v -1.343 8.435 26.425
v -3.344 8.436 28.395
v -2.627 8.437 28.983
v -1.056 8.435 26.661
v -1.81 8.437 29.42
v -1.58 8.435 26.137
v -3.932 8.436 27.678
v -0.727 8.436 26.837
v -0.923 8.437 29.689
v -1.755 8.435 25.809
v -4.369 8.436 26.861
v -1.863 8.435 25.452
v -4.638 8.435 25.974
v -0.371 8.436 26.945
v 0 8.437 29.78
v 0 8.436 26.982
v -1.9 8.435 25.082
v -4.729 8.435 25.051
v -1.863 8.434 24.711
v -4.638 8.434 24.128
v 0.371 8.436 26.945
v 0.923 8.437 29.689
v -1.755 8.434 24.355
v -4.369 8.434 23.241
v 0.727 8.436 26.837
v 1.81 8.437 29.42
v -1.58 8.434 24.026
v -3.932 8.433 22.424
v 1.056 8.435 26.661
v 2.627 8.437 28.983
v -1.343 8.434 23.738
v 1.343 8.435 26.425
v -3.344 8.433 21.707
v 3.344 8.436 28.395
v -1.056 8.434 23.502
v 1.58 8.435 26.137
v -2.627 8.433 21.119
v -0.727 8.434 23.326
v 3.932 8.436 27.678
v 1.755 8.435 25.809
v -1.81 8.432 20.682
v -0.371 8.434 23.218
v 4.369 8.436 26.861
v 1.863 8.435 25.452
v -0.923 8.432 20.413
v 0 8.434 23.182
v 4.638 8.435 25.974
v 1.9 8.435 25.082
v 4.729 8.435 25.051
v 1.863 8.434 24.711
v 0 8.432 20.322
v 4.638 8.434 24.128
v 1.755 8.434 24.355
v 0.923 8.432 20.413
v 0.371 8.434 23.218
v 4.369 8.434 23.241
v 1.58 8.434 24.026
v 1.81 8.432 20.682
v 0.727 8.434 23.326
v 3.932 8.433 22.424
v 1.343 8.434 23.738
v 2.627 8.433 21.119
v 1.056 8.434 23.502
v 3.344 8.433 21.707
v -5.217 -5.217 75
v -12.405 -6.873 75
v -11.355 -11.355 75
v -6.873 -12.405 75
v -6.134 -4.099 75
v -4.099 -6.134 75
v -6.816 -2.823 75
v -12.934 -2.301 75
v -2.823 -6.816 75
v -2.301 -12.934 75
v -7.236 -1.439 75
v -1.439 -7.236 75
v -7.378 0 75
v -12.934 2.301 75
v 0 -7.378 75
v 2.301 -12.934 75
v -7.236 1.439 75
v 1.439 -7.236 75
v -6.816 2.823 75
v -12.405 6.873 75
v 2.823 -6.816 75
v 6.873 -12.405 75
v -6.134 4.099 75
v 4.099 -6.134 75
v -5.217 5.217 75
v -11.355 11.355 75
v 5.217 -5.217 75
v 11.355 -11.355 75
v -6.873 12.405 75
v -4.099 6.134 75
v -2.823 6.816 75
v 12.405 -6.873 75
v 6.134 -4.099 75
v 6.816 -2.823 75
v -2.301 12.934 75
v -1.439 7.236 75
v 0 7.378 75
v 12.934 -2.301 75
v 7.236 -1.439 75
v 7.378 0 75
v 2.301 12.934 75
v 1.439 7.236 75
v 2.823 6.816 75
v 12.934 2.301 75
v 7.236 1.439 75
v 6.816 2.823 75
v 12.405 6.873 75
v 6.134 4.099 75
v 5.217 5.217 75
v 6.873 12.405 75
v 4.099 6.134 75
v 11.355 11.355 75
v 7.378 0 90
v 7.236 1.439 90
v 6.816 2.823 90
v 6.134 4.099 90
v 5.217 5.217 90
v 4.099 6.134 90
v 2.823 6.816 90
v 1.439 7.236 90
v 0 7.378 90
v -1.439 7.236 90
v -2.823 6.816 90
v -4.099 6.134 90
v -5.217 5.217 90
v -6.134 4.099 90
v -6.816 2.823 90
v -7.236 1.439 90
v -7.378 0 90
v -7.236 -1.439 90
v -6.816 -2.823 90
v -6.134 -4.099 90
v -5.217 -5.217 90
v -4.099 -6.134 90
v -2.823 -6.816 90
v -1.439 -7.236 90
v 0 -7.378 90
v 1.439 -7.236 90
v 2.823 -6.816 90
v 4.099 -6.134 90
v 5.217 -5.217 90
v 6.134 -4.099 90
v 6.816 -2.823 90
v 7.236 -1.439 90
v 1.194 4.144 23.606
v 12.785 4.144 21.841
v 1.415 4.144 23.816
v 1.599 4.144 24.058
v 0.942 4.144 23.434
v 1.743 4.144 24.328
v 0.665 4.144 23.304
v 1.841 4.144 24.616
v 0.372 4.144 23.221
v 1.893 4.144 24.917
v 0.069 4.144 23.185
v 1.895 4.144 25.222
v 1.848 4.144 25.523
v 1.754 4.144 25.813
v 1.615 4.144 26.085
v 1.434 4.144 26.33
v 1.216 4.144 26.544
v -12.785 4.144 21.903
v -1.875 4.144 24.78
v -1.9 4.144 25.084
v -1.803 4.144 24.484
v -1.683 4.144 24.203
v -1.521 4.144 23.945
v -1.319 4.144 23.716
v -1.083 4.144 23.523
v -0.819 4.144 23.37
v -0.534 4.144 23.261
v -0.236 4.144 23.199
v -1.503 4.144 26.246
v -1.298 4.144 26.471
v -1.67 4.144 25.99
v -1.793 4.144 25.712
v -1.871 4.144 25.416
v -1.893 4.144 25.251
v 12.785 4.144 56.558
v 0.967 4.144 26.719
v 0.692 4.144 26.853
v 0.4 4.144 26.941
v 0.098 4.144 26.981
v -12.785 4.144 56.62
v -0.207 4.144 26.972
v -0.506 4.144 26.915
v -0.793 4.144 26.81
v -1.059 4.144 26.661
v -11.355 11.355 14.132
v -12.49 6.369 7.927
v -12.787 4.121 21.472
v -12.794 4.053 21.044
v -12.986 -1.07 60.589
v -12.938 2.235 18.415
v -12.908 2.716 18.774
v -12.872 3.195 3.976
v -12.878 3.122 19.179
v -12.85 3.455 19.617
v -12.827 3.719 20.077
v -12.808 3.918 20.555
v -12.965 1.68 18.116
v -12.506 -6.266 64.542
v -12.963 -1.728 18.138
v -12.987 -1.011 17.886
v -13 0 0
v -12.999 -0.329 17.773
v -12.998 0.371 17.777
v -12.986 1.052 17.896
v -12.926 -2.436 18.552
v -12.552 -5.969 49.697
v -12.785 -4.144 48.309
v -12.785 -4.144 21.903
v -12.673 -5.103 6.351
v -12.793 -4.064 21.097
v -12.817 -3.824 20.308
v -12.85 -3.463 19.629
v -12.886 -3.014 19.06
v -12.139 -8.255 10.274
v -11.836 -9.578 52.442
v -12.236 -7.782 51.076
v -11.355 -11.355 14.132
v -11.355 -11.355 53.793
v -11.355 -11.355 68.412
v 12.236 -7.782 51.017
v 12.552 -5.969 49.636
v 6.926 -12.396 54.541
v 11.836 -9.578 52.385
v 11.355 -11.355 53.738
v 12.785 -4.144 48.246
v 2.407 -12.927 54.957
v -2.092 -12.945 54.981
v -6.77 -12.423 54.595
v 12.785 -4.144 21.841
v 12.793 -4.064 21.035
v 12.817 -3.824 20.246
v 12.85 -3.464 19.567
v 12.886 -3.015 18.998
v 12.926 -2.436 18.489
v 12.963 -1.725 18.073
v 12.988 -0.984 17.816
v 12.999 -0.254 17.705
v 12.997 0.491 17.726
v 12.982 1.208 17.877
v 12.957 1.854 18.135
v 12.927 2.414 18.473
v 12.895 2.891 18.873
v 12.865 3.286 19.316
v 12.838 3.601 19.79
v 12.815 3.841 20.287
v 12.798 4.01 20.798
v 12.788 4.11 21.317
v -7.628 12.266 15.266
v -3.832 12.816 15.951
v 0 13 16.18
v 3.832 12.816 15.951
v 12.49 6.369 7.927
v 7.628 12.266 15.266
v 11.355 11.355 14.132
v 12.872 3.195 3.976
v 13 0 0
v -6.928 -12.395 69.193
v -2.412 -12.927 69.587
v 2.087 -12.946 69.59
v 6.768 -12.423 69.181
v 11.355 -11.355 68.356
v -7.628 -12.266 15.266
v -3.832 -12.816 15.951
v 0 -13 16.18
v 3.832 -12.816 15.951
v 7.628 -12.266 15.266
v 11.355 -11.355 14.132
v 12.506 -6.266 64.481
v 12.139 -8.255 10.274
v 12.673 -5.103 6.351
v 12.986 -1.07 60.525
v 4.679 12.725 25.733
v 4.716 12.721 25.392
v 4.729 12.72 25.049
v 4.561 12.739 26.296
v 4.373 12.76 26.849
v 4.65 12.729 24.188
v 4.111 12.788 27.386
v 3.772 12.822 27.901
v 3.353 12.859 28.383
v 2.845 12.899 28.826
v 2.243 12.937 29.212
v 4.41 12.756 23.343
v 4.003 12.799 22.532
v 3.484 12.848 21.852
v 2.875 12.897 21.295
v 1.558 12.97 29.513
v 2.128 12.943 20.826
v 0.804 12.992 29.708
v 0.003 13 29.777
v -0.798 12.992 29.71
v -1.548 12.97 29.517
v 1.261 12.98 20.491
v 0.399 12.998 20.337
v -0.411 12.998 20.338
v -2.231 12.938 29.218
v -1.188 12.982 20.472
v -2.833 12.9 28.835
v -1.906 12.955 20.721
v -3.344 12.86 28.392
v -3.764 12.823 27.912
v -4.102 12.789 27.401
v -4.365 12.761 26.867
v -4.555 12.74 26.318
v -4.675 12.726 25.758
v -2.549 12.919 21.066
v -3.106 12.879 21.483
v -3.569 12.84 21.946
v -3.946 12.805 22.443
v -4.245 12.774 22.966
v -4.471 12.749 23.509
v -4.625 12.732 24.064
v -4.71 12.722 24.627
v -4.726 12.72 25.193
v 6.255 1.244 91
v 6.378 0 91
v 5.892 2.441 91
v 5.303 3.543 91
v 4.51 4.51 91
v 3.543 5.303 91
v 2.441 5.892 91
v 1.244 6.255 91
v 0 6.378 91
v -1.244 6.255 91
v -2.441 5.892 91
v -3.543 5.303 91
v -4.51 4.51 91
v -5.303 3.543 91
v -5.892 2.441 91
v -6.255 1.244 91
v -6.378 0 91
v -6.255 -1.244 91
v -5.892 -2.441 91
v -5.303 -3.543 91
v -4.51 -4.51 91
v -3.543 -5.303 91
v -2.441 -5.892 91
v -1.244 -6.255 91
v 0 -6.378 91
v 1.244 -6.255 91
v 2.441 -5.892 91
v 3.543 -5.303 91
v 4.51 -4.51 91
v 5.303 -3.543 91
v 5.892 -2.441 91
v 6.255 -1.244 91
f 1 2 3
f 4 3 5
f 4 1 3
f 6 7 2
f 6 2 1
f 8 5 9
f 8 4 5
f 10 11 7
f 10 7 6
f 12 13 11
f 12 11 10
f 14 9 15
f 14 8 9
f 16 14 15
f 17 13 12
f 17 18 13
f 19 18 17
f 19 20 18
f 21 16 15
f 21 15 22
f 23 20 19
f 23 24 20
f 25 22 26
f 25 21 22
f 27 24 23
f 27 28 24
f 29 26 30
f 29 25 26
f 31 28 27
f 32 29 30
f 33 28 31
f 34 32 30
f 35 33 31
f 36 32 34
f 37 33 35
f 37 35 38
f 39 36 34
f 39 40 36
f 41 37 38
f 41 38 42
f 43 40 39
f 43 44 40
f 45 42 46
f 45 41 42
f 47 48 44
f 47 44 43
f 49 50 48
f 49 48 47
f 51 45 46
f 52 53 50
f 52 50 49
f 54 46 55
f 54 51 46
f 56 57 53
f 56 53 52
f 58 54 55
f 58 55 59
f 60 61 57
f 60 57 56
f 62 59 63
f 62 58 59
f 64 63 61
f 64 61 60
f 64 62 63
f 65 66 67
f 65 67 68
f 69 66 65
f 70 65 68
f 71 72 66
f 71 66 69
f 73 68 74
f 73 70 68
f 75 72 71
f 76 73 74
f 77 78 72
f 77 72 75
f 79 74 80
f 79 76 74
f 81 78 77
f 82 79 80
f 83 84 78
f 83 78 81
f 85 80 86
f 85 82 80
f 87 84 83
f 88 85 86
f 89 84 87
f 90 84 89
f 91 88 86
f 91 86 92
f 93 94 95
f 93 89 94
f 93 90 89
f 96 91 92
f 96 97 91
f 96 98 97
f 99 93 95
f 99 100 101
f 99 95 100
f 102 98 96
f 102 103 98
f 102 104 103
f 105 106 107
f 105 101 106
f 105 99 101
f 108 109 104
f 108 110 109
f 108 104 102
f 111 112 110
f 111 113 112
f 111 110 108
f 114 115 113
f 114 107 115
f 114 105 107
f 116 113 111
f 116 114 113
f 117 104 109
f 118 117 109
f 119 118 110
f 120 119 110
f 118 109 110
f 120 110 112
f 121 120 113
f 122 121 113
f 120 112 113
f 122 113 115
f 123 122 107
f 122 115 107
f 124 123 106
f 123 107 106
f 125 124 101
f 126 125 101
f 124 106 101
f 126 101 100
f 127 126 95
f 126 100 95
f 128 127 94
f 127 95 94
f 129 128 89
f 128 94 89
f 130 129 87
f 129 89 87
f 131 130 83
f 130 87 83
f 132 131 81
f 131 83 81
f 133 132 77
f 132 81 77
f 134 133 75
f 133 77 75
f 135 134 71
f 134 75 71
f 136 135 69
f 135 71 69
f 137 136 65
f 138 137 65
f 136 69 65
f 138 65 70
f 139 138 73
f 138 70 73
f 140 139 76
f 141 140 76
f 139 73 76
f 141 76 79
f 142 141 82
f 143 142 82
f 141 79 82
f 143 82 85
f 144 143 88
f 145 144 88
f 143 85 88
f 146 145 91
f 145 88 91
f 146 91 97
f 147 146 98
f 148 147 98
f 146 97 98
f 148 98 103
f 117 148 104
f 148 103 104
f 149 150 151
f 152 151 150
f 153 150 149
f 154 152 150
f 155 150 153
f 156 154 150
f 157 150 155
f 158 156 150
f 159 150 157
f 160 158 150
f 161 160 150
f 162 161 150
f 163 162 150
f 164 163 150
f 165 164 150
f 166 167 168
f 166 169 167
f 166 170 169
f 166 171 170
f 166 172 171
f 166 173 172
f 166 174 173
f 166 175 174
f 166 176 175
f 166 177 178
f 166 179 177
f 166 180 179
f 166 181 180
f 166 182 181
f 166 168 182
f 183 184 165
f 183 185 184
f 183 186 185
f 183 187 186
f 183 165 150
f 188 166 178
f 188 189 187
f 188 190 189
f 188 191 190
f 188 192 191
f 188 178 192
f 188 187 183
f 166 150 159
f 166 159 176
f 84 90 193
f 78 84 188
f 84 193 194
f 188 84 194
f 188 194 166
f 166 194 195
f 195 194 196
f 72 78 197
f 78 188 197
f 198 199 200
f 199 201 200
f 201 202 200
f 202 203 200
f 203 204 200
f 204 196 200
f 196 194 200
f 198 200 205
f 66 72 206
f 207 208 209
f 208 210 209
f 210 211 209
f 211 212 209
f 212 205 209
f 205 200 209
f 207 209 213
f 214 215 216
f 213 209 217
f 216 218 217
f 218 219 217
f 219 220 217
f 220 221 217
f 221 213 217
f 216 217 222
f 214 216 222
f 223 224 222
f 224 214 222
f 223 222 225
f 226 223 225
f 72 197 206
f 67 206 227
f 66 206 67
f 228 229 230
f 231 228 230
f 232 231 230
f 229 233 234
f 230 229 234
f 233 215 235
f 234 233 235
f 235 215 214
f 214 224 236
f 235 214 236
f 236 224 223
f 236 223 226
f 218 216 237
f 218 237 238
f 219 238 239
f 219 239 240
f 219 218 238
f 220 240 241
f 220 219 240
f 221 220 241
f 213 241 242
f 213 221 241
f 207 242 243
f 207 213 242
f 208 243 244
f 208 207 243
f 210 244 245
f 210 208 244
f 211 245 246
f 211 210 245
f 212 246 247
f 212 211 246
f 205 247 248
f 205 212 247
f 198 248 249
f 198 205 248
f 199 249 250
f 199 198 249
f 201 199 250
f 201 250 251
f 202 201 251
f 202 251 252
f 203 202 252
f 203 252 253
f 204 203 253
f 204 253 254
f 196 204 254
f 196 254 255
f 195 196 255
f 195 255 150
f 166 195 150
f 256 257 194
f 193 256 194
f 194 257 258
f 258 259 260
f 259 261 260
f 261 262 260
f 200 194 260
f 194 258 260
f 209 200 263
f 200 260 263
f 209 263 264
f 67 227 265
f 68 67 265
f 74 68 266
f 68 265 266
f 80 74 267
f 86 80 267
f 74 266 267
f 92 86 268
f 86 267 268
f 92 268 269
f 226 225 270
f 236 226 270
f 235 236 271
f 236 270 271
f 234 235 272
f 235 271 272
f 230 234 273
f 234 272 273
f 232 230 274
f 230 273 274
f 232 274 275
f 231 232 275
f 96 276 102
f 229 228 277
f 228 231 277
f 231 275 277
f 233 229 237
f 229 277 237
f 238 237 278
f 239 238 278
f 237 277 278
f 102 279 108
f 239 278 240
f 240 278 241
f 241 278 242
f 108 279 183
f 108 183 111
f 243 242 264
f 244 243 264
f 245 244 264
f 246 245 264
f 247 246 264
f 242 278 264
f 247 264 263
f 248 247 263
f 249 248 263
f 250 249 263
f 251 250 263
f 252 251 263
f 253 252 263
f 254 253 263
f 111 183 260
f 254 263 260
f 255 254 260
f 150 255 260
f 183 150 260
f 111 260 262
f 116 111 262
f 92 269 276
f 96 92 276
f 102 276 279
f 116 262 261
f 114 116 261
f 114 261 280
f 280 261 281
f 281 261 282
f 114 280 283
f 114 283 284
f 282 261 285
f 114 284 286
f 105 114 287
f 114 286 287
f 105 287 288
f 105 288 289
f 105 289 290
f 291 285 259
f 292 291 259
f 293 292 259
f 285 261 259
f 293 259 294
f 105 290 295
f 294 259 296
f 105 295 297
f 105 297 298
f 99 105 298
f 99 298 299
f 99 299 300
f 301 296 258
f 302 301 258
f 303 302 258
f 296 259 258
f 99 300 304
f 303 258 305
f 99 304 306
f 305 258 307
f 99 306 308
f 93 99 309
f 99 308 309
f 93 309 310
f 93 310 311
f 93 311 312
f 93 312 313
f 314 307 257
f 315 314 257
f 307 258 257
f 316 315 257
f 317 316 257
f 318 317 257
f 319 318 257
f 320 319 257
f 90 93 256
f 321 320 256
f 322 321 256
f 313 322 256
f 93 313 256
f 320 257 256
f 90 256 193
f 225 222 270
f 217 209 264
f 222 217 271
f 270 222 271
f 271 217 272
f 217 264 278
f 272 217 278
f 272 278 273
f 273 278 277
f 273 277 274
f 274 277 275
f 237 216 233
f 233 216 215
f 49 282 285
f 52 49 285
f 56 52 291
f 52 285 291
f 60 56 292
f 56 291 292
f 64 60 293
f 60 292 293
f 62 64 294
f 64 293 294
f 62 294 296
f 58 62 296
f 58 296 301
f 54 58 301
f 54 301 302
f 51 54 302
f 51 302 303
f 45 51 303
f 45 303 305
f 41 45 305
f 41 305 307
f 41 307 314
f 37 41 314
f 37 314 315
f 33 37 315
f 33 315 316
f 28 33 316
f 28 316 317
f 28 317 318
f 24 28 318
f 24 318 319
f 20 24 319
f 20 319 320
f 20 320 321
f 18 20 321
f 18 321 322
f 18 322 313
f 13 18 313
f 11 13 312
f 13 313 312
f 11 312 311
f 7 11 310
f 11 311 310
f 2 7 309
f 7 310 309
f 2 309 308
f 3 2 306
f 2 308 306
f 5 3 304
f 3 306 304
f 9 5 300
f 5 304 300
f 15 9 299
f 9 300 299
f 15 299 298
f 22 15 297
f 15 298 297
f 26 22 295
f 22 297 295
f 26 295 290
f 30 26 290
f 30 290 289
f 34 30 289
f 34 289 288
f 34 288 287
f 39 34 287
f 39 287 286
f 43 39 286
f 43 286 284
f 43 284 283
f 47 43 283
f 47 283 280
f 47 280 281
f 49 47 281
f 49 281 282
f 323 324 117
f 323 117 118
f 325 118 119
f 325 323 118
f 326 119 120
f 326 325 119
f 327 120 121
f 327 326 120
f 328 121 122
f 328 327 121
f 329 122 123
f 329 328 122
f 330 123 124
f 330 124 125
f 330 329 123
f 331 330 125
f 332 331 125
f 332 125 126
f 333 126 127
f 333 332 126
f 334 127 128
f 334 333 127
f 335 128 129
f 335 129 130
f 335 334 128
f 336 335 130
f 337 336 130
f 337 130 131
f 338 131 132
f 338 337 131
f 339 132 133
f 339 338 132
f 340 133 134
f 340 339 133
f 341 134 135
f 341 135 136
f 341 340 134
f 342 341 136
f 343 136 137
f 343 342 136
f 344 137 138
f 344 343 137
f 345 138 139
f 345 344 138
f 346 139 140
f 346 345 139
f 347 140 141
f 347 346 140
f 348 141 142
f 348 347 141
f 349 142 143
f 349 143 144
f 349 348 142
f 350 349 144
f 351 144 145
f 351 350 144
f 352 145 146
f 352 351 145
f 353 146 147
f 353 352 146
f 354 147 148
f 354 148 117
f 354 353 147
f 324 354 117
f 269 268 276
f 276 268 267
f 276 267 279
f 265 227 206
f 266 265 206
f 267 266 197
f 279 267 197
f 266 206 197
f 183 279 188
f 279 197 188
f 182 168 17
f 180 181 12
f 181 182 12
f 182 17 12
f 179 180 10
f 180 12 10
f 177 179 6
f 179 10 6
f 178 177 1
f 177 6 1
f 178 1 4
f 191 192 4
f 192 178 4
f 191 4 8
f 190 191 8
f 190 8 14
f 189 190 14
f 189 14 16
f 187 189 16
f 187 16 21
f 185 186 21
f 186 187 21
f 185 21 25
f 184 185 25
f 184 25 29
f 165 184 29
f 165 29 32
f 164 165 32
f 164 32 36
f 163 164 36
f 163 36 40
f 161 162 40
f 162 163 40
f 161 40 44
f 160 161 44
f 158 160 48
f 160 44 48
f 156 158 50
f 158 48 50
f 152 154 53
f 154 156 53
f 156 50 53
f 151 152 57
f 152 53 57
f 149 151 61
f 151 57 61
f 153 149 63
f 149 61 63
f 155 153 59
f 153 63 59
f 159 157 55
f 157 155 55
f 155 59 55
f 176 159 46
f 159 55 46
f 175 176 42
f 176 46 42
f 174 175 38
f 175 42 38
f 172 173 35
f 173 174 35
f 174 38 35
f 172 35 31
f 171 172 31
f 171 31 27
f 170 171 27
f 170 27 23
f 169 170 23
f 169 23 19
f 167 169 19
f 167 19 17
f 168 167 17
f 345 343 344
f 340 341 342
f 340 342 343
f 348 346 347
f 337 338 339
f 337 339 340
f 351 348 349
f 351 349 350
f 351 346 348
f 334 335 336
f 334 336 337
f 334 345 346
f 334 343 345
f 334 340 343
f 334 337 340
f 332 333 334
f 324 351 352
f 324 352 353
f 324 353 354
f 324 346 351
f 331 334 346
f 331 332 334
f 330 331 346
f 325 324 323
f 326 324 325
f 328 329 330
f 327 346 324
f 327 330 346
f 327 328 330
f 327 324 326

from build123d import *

# Parameters (mm, degrees)
PAD_DEPTH            = 75
SKETCH001_R          = 7.377572
PAD001_DEPTH         = 16
CHAMFER_SIZE         = 1
POCKET_DEPTH         = 13.001
POCKET_DEPTH_BACK    = -13.001
SKETCH003_R          = 4.728662
POCKET001_DEPTH      = 5
POCKET002_DEPTH      = 0.001
POCKET002_DEPTH_BACK = -27.579089
SKETCH005_R          = 1.899906
POCKET003_DEPTH      = 5


with BuildPart() as part:
    # Sketch → Pad (new body)
    with BuildSketch(Plane.XY):
        with BuildLine():
            ThreePointArc((-11.354577, 11.354577), (-13, 0), (-11.354577, -11.354577))
            ThreePointArc((-11.354577, -11.354577), (0, -13), (11.354577, -11.354577))
            ThreePointArc((11.354577, -11.354577), (13, 0), (11.354577, 11.354577))
            ThreePointArc((11.354577, 11.354577), (0, 13), (-11.354577, 11.354577))
        make_face()
    extrude(amount=PAD_DEPTH)

    # Sketch001 (on Face6 of Pad) → Pad001 (join)
    with BuildSketch(Plane.XY.offset(75)):
        Circle(SKETCH001_R)
    extrude(amount=PAD001_DEPTH)

    # Chamfer
    chamfer_edges = [part.edges().sort_by_distance(p)[0] for p in [
        (-7.377572, 0, 91),
    ]]
    chamfer(chamfer_edges, length=CHAMFER_SIZE)

    # Sketch002 → Pocket (cut, two sides)
    with BuildSketch(Plane.YZ) as pocket_sk:
        Polygon((0, 0), (-18.582906, 23.128181), (-18.582906, -17.102173), (18.582906, -17.102173), (18.582906, 23.128181), align=None)
    extrude(amount=-POCKET_DEPTH, mode=Mode.SUBTRACT)
    extrude(pocket_sk.sketch, amount=-POCKET_DEPTH_BACK, mode=Mode.SUBTRACT)

    # Sketch003 (on DatumPlane) → Pocket001 (cut)
    with BuildSketch(Plane(origin=(0, 13.444963, 45.243954), x_dir=(1, 0, 0), z_dir=(0, 1, -0.000512))):
        with Locations((0, 20.195527)):
            Circle(SKETCH003_R)
    extrude(amount=-POCKET001_DEPTH, mode=Mode.SUBTRACT)

    # Sketch004 (on DatumPlane) → Pocket002 (cut, two sides)
    with BuildSketch(Plane(origin=(-14.478585, 0, 40.939498), x_dir=(0, 1, 0), z_dir=(0.999997, 0, -0.002433))) as pocket002_sk:
        with BuildLine():
            ThreePointArc((-4.143615, -19.031831), (0, -23.175446), (4.143615, -19.031831))
            Line((4.143615, -19.031831), (4.143615, 15.684834))
            Line((-15.203477, 30.408852), (4.143615, 15.684834))
            Line((-15.203477, 30.408852), (-20.945486, 20.160222))
            Line((-4.143615, 7.373234), (-20.945486, 20.160222))
            Line((-4.143615, -19.031831), (-4.143615, 7.373234))
        make_face()
    extrude(amount=-POCKET002_DEPTH, mode=Mode.SUBTRACT)
    extrude(pocket002_sk.sketch, amount=-POCKET002_DEPTH_BACK, mode=Mode.SUBTRACT)

    # Sketch005 (on Face18 of Pocket002) → Pocket003 (cut)
    with BuildSketch(Plane(origin=(0, 8.421799, -0.004311), x_dir=(-1, 0, 0), z_dir=(0, 1, -0.000512))):
        with Locations((0, 25.085957)):
            Circle(SKETCH005_R)
    extrude(amount=-POCKET003_DEPTH, mode=Mode.SUBTRACT)


solid = part.part
